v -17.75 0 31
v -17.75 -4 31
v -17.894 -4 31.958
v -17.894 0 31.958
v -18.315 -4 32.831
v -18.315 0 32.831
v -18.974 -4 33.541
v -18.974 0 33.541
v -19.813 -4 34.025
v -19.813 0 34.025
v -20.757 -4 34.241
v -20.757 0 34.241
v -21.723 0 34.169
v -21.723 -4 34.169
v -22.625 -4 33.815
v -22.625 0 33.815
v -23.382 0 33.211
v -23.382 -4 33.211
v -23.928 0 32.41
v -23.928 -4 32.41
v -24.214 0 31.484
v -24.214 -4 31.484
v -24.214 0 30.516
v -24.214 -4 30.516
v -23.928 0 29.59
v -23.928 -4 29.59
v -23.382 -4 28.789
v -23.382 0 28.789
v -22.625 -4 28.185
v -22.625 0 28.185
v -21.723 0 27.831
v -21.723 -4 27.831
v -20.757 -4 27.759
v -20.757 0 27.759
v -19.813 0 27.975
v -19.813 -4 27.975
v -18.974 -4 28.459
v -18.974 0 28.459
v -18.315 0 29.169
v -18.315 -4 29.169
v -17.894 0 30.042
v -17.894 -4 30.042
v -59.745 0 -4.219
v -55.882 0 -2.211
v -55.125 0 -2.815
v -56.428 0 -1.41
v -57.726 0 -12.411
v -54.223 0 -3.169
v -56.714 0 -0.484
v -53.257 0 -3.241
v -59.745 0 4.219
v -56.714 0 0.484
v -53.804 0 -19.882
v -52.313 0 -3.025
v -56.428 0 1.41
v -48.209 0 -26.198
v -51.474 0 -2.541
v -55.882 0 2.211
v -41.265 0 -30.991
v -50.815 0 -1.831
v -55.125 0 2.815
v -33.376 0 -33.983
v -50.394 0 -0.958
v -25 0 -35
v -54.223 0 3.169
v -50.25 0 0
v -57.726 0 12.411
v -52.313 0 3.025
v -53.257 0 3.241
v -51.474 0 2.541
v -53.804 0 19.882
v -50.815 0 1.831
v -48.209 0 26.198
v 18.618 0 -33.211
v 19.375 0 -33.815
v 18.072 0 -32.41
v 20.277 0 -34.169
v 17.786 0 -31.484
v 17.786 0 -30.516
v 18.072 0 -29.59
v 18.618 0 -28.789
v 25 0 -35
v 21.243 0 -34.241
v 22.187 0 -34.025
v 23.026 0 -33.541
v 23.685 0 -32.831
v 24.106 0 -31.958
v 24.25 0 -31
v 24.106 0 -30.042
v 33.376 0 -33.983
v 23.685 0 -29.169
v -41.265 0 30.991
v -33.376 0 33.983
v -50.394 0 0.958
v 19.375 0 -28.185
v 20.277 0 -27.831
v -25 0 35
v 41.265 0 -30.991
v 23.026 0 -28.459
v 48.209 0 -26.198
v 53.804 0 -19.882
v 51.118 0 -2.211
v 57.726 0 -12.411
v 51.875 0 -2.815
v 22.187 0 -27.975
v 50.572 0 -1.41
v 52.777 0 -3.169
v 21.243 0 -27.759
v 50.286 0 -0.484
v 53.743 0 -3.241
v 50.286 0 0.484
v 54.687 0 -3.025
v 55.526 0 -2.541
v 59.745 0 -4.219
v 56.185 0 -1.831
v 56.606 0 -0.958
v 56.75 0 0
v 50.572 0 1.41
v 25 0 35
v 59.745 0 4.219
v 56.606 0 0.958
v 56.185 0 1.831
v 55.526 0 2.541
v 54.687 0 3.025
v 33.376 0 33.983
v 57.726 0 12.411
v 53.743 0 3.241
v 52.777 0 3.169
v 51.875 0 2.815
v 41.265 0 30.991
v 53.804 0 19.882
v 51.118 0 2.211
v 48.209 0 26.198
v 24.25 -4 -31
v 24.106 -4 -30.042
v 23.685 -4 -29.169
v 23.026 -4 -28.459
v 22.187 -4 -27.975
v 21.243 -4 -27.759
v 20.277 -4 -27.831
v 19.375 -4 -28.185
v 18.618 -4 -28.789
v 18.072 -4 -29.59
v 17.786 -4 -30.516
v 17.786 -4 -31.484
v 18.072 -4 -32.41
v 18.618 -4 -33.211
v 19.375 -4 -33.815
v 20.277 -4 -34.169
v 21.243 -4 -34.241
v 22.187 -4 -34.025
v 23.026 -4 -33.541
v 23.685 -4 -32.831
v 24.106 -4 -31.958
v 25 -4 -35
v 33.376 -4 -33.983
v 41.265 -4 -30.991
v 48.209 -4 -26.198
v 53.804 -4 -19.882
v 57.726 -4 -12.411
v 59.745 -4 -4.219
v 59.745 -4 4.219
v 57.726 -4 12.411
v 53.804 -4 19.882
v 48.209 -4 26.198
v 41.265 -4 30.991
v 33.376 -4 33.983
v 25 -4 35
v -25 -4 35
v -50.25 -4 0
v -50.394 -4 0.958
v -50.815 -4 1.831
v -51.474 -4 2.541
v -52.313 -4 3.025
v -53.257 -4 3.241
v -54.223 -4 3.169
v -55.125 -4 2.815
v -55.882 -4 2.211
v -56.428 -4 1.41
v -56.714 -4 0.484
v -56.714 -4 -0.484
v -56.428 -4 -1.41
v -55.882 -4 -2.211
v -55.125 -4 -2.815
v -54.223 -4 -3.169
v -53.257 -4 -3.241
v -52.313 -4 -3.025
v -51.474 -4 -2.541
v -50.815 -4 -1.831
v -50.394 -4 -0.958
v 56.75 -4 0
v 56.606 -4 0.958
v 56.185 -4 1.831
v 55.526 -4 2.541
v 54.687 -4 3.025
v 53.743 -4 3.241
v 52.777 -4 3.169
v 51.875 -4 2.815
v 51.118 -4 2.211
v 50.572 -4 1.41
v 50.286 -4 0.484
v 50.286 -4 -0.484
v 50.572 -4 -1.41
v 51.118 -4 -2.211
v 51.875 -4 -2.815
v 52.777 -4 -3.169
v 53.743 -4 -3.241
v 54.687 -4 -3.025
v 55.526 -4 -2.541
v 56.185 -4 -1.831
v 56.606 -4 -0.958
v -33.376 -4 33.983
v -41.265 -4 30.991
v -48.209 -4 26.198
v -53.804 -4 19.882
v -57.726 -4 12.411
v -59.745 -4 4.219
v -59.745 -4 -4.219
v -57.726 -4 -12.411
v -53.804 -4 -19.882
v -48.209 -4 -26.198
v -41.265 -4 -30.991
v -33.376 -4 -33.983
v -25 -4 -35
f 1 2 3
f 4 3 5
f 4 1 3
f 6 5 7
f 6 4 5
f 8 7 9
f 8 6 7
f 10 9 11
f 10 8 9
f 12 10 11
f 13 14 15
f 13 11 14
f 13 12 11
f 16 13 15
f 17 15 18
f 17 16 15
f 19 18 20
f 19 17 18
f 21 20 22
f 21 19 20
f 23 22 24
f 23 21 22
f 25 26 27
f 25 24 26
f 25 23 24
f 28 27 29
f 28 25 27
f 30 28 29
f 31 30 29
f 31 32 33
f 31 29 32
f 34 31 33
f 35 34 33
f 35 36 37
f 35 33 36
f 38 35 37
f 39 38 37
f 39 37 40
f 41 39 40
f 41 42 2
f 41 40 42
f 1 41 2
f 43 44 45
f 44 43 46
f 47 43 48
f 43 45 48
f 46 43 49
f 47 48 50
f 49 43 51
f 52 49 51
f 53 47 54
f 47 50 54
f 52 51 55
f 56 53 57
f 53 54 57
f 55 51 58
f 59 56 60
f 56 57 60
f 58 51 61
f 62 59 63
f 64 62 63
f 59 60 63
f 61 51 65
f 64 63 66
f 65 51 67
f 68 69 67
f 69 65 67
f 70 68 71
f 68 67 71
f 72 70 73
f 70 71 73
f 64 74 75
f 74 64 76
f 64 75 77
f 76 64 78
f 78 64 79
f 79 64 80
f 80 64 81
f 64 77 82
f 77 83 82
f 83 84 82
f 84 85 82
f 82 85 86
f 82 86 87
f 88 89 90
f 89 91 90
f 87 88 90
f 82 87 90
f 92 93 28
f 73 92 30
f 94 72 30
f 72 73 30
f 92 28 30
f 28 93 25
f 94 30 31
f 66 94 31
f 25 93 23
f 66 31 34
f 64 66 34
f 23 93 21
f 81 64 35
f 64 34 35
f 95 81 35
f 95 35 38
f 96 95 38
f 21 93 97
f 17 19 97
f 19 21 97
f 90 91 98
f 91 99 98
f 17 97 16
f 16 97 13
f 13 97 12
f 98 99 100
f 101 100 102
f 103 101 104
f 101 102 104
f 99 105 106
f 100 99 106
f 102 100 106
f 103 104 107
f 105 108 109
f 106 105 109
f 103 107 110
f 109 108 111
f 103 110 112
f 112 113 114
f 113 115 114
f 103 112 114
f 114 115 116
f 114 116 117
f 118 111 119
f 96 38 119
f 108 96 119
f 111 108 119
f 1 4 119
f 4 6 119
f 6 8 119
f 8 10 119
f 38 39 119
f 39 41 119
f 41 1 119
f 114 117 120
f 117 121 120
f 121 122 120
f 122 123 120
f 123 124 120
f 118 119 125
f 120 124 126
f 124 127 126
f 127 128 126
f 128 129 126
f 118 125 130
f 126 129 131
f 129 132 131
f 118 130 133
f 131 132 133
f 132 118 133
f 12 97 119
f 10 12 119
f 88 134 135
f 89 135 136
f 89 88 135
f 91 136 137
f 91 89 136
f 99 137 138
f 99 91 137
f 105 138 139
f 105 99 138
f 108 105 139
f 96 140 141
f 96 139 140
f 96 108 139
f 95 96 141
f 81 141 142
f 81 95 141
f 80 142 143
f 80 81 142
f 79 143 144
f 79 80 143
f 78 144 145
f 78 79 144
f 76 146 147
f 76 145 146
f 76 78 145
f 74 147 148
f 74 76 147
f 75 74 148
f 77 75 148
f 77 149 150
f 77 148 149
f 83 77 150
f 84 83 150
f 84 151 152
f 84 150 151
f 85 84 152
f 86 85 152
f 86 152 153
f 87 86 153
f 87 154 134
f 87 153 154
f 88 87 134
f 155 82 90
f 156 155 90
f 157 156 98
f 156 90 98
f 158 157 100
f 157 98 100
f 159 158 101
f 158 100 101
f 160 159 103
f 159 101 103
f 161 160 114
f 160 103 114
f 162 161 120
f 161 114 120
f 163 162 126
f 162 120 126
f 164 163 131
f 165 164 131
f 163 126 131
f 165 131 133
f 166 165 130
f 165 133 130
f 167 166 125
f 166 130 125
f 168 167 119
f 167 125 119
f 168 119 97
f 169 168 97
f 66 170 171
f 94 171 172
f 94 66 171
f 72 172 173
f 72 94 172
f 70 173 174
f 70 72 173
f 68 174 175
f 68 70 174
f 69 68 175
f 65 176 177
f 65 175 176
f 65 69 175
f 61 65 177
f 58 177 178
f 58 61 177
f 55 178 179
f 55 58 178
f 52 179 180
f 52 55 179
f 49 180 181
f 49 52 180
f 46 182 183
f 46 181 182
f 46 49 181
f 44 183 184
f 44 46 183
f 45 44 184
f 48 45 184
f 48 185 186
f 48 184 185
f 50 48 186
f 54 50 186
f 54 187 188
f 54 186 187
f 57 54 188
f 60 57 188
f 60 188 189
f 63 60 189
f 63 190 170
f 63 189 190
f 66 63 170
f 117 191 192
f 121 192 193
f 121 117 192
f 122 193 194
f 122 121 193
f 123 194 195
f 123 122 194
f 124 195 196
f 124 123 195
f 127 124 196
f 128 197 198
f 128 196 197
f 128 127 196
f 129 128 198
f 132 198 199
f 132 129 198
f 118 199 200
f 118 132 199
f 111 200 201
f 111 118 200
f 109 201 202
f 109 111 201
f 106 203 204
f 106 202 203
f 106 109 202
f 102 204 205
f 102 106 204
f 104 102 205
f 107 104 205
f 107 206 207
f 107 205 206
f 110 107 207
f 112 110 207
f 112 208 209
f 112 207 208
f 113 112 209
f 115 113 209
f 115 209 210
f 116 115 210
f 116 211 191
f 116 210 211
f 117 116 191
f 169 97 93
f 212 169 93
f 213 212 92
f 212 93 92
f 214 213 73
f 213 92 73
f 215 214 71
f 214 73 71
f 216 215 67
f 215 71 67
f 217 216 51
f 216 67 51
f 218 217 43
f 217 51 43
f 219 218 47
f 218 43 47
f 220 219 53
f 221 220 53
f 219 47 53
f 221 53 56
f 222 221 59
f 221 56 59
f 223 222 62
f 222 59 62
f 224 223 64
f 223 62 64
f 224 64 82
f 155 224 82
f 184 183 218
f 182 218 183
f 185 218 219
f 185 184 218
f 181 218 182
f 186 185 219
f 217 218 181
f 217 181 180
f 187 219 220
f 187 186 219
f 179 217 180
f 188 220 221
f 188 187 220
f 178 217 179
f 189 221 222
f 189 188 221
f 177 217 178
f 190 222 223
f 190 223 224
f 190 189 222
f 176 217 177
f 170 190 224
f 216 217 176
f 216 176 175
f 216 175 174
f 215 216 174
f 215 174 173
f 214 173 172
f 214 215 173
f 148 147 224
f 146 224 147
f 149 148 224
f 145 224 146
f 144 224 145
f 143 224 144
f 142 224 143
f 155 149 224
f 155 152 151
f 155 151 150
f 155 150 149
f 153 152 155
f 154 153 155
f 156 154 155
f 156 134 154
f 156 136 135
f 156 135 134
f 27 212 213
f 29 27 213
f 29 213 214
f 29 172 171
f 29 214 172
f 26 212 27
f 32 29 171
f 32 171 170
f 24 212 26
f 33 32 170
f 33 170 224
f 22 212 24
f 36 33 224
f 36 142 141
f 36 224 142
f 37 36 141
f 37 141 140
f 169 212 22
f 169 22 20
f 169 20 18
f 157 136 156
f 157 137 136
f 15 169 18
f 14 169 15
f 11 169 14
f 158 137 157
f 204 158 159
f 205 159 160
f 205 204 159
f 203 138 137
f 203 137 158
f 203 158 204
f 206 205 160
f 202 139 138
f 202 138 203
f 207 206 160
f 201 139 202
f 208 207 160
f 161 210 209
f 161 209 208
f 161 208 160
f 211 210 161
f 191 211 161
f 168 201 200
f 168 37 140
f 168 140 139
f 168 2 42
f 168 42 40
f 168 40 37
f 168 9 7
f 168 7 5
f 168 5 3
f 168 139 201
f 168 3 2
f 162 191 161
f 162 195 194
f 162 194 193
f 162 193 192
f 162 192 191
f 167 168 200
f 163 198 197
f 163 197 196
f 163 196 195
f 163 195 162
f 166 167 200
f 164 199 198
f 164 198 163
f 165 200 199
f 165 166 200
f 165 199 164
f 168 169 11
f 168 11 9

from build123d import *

# Parameters (mm, degrees)
F1_DEPTH = 4
F2_R     = 3.25
F3_DEPTH = 4.001


with BuildPart() as f1:
    # F0 (on Front) → F1 (new body)
    with BuildSketch(Plane.XZ):
        with BuildLine():
            Line((25, 35), (-25, 35))
            ThreePointArc((-25, 35), (-60, 0), (-25, -35))
            Line((-25, -35), (25, -35))
            ThreePointArc((25, -35), (60, 0), (25, 35))
        make_face()
    extrude(amount=F1_DEPTH)

    # F2 (on Front) → F3 (cut, through all)
    with BuildSketch(Plane.XZ):
        with Locations((-21, 31)):
            Circle(F2_R)
        with Locations((21, -31)):
            Circle(F2_R)
        with Locations((53.5, 0)):
            Circle(F2_R)
        with Locations((-53.5, 0)):
            Circle(F2_R)
    extrude(amount=F3_DEPTH, mode=Mode.SUBTRACT)


solid = f1.part
